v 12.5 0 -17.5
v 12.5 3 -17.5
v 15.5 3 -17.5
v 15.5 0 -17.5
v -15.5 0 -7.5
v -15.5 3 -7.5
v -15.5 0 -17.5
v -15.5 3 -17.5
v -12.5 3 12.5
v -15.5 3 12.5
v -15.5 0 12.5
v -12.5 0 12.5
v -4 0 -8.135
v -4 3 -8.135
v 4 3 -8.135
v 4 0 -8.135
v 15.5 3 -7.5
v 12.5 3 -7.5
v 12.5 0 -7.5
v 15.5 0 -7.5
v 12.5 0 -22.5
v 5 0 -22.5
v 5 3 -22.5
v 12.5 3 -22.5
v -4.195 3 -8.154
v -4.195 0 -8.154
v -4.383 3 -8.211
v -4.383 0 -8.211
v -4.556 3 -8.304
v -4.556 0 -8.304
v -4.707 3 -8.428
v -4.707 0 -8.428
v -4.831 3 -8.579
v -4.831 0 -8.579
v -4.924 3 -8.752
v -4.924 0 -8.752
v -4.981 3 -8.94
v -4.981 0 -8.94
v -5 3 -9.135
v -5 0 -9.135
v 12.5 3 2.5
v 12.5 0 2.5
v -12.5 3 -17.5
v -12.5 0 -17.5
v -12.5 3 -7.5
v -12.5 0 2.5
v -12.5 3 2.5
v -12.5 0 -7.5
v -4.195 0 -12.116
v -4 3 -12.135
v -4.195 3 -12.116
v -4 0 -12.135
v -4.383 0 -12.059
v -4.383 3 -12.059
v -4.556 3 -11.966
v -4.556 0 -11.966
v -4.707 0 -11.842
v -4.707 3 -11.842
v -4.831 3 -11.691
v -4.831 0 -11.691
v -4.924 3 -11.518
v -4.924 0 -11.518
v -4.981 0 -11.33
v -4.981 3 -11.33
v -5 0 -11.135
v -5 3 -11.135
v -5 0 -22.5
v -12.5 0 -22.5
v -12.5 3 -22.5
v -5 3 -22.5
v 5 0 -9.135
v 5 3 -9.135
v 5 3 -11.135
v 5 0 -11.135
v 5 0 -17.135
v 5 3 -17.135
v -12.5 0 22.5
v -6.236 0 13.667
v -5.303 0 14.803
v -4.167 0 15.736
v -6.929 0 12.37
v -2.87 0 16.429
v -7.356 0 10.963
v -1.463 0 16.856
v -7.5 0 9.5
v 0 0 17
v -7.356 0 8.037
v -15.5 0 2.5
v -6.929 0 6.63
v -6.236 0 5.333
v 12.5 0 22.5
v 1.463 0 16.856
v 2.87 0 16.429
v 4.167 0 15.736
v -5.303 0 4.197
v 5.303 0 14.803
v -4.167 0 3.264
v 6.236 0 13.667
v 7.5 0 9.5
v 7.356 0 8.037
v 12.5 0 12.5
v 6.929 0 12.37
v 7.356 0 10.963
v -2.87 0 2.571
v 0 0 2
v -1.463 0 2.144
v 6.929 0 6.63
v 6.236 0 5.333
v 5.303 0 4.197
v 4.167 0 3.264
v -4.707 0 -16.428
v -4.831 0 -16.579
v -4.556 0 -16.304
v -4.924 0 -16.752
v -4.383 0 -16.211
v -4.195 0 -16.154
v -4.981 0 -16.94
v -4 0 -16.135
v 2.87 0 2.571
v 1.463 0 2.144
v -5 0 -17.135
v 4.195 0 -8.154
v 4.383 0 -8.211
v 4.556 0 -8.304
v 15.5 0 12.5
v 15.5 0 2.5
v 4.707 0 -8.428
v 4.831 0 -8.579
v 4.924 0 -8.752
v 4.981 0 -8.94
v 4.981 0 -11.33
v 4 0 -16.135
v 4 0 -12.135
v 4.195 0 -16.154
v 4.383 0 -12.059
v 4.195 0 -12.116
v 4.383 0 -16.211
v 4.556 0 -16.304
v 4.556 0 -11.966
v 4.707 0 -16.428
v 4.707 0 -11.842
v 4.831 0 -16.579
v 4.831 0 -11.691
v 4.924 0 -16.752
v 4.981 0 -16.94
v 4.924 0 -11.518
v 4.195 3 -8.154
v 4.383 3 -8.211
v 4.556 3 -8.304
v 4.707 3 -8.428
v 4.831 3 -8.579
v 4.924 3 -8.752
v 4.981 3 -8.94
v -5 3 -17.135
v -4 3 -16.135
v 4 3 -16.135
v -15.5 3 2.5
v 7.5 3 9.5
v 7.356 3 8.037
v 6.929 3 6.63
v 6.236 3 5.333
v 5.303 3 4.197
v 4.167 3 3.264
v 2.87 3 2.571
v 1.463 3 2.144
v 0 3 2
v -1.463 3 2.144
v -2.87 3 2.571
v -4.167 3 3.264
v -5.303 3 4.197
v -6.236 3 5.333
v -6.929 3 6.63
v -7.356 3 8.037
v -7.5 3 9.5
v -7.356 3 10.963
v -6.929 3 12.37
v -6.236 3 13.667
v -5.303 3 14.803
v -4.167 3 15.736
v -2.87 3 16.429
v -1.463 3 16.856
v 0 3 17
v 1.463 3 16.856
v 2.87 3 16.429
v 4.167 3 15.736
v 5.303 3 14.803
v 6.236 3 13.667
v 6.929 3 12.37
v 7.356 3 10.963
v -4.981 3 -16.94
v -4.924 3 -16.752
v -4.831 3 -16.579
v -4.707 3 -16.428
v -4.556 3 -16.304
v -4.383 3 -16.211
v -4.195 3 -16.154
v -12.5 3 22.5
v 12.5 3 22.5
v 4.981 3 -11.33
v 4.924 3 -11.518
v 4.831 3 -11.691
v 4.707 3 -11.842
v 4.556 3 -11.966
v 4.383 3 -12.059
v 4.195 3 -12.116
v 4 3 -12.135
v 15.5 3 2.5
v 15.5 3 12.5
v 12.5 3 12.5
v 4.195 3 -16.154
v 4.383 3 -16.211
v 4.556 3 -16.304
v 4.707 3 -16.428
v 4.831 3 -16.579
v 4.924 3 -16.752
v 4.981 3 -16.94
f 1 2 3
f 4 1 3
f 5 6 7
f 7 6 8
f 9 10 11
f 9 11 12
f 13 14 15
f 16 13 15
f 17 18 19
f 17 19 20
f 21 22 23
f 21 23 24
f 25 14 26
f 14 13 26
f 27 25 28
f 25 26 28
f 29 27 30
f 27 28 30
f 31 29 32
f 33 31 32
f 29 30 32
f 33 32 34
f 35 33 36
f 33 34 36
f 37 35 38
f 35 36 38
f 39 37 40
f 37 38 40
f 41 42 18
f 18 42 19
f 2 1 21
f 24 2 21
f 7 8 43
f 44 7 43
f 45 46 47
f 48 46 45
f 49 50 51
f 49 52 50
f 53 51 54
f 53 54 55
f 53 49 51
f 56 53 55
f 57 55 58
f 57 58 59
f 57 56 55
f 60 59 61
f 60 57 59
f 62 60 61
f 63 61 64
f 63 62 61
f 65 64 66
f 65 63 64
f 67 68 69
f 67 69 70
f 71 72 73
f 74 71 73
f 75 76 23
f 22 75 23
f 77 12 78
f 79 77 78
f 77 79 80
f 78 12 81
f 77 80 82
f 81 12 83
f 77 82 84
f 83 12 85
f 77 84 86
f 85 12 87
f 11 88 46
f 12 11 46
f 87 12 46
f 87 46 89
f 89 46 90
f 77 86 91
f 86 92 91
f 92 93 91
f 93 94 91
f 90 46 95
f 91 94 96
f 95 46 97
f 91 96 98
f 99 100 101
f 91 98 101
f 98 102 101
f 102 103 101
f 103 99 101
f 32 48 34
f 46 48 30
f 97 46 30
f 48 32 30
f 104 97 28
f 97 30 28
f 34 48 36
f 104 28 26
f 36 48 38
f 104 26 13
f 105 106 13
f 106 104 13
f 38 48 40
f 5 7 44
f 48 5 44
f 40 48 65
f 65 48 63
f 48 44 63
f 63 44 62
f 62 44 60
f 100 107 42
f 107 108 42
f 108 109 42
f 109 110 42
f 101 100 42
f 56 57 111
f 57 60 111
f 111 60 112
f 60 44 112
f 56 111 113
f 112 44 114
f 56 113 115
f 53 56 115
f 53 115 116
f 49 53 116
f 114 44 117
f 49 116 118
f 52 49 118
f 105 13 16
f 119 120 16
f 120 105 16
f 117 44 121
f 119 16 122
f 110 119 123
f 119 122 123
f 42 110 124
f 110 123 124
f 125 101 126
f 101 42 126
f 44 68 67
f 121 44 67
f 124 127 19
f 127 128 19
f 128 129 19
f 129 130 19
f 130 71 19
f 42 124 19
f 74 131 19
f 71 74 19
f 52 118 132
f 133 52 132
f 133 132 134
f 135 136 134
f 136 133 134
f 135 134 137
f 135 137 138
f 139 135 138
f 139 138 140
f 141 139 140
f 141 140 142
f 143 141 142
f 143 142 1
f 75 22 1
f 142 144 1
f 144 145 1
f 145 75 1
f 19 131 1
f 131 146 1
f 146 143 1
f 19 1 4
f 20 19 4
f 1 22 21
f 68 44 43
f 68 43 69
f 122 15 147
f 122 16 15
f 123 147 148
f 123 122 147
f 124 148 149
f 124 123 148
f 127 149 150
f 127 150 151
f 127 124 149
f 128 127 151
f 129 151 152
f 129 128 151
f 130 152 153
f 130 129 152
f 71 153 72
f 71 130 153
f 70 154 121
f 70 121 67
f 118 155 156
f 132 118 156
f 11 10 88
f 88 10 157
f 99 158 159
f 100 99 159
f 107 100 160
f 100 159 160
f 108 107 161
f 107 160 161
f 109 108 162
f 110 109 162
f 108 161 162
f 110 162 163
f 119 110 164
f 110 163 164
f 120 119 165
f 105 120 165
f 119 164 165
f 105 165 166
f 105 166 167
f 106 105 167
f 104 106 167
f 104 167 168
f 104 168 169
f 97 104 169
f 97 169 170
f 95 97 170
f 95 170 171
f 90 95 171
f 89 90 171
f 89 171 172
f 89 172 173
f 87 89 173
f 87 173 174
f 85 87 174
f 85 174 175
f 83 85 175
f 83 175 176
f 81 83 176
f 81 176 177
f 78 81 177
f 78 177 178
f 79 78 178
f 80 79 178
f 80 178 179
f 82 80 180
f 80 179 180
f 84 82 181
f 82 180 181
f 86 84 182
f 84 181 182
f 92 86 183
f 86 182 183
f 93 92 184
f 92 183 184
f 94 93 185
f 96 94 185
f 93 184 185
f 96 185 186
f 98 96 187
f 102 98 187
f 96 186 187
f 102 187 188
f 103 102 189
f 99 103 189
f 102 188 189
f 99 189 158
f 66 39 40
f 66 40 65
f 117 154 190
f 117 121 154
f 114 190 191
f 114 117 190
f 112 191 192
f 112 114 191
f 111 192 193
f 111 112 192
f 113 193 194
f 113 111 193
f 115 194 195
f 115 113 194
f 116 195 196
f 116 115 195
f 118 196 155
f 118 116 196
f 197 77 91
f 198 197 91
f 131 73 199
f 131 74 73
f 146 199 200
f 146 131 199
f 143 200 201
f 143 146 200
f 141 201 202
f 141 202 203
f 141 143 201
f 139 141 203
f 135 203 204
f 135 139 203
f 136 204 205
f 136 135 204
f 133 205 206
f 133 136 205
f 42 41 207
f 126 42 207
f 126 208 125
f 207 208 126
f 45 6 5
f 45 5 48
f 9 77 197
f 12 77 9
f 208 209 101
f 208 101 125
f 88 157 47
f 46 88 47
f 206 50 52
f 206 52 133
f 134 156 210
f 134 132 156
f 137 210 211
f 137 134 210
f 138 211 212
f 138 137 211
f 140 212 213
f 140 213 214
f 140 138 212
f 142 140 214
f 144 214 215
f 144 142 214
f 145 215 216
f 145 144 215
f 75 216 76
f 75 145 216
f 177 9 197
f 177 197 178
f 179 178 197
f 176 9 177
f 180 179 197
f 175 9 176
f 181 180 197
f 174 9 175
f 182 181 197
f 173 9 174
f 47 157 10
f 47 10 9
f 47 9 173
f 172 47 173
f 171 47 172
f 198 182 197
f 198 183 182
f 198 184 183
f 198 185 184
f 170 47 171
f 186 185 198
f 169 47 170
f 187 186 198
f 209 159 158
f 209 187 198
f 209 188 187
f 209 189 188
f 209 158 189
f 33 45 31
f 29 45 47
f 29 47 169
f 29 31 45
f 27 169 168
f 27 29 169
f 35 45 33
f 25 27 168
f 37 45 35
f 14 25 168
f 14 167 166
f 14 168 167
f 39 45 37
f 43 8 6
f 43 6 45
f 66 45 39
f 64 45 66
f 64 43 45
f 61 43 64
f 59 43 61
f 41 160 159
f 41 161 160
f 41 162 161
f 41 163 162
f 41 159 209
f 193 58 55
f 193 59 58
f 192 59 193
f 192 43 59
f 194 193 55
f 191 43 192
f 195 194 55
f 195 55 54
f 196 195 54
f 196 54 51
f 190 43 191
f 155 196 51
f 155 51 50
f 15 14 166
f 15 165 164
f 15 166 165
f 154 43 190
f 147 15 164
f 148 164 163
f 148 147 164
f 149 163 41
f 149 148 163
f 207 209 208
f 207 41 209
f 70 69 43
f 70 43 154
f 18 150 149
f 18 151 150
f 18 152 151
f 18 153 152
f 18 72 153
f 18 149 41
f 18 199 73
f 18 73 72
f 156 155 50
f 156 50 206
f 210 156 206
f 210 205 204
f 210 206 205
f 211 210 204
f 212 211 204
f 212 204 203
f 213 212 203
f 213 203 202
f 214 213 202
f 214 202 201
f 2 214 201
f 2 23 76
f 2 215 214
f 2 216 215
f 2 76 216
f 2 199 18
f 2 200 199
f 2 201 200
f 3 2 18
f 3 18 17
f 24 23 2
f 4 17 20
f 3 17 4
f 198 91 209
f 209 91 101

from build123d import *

# Parameters (mm, degrees)
SKETCH1_W           = 25
SKETCH1_H           = 45
BOSS_EXTRUDE1_DEPTH = 3
SKETCH2_R           = 7.5
SKETCH2_W           = 10
SKETCH2_H           = 6.365
SKETCH2_H_2         = 4
CUT_EXTRUDE1_DEPTH  = 4
FILLET1_R           = 1
SKETCH3_W           = 3
SKETCH3_H           = 10
BOSS_EXTRUDE2_DEPTH = 3


with BuildPart() as part:
    # Sketch1 → Boss-Extrude1 (new body)
    with BuildSketch(Plane(origin=(0, 0, 0), x_dir=(1, 0, 0), z_dir=(0, 1, 0))):
        Rectangle(SKETCH1_W, SKETCH1_H)
    extrude(amount=BOSS_EXTRUDE1_DEPTH)

    # Sketch2 → Cut-Extrude1 (cut, through all)
    with BuildSketch(Plane(origin=(0, 3, 0), x_dir=(1, 0, 0), z_dir=(0, 1, 0))):
        with Locations((0, -9.5)):
            Circle(SKETCH2_R)
        with Locations((0, 19.3175)):
            Rectangle(SKETCH2_W, SKETCH2_H)
        with Locations((0, 10.135)):
            Rectangle(SKETCH2_W, SKETCH2_H_2)
    extrude(amount=-CUT_EXTRUDE1_DEPTH, mode=Mode.SUBTRACT)

    # Fillet1
    fillet1_edges = [part.edges().sort_by_distance(p)[0] for p in [
        (-5, 1.5, -16.135),
        (5, 1.5, -16.135),
        (-5, 1.5, -8.135),
        (-5, 1.5, -12.135),
        (5, 1.5, -12.135),
        (5, 1.5, -8.135),
    ]]
    fillet(fillet1_edges, radius=FILLET1_R)

    # Sketch3 → Boss-Extrude2 (add)
    with BuildSketch(Plane(origin=(0, 3, 0), x_dir=(1, 0, 0), z_dir=(0, 1, 0))):
        with Locations((14, -7.5)):
            Rectangle(SKETCH3_W, SKETCH3_H)
        with Locations((14, 12.5)):
            Rectangle(SKETCH3_W, SKETCH3_H)
        with Locations((-14, -7.5)):
            Rectangle(SKETCH3_W, SKETCH3_H)
        with Locations((-14, 12.5)):
            Rectangle(SKETCH3_W, SKETCH3_H)
    extrude(amount=-BOSS_EXTRUDE2_DEPTH)


solid = part.part
